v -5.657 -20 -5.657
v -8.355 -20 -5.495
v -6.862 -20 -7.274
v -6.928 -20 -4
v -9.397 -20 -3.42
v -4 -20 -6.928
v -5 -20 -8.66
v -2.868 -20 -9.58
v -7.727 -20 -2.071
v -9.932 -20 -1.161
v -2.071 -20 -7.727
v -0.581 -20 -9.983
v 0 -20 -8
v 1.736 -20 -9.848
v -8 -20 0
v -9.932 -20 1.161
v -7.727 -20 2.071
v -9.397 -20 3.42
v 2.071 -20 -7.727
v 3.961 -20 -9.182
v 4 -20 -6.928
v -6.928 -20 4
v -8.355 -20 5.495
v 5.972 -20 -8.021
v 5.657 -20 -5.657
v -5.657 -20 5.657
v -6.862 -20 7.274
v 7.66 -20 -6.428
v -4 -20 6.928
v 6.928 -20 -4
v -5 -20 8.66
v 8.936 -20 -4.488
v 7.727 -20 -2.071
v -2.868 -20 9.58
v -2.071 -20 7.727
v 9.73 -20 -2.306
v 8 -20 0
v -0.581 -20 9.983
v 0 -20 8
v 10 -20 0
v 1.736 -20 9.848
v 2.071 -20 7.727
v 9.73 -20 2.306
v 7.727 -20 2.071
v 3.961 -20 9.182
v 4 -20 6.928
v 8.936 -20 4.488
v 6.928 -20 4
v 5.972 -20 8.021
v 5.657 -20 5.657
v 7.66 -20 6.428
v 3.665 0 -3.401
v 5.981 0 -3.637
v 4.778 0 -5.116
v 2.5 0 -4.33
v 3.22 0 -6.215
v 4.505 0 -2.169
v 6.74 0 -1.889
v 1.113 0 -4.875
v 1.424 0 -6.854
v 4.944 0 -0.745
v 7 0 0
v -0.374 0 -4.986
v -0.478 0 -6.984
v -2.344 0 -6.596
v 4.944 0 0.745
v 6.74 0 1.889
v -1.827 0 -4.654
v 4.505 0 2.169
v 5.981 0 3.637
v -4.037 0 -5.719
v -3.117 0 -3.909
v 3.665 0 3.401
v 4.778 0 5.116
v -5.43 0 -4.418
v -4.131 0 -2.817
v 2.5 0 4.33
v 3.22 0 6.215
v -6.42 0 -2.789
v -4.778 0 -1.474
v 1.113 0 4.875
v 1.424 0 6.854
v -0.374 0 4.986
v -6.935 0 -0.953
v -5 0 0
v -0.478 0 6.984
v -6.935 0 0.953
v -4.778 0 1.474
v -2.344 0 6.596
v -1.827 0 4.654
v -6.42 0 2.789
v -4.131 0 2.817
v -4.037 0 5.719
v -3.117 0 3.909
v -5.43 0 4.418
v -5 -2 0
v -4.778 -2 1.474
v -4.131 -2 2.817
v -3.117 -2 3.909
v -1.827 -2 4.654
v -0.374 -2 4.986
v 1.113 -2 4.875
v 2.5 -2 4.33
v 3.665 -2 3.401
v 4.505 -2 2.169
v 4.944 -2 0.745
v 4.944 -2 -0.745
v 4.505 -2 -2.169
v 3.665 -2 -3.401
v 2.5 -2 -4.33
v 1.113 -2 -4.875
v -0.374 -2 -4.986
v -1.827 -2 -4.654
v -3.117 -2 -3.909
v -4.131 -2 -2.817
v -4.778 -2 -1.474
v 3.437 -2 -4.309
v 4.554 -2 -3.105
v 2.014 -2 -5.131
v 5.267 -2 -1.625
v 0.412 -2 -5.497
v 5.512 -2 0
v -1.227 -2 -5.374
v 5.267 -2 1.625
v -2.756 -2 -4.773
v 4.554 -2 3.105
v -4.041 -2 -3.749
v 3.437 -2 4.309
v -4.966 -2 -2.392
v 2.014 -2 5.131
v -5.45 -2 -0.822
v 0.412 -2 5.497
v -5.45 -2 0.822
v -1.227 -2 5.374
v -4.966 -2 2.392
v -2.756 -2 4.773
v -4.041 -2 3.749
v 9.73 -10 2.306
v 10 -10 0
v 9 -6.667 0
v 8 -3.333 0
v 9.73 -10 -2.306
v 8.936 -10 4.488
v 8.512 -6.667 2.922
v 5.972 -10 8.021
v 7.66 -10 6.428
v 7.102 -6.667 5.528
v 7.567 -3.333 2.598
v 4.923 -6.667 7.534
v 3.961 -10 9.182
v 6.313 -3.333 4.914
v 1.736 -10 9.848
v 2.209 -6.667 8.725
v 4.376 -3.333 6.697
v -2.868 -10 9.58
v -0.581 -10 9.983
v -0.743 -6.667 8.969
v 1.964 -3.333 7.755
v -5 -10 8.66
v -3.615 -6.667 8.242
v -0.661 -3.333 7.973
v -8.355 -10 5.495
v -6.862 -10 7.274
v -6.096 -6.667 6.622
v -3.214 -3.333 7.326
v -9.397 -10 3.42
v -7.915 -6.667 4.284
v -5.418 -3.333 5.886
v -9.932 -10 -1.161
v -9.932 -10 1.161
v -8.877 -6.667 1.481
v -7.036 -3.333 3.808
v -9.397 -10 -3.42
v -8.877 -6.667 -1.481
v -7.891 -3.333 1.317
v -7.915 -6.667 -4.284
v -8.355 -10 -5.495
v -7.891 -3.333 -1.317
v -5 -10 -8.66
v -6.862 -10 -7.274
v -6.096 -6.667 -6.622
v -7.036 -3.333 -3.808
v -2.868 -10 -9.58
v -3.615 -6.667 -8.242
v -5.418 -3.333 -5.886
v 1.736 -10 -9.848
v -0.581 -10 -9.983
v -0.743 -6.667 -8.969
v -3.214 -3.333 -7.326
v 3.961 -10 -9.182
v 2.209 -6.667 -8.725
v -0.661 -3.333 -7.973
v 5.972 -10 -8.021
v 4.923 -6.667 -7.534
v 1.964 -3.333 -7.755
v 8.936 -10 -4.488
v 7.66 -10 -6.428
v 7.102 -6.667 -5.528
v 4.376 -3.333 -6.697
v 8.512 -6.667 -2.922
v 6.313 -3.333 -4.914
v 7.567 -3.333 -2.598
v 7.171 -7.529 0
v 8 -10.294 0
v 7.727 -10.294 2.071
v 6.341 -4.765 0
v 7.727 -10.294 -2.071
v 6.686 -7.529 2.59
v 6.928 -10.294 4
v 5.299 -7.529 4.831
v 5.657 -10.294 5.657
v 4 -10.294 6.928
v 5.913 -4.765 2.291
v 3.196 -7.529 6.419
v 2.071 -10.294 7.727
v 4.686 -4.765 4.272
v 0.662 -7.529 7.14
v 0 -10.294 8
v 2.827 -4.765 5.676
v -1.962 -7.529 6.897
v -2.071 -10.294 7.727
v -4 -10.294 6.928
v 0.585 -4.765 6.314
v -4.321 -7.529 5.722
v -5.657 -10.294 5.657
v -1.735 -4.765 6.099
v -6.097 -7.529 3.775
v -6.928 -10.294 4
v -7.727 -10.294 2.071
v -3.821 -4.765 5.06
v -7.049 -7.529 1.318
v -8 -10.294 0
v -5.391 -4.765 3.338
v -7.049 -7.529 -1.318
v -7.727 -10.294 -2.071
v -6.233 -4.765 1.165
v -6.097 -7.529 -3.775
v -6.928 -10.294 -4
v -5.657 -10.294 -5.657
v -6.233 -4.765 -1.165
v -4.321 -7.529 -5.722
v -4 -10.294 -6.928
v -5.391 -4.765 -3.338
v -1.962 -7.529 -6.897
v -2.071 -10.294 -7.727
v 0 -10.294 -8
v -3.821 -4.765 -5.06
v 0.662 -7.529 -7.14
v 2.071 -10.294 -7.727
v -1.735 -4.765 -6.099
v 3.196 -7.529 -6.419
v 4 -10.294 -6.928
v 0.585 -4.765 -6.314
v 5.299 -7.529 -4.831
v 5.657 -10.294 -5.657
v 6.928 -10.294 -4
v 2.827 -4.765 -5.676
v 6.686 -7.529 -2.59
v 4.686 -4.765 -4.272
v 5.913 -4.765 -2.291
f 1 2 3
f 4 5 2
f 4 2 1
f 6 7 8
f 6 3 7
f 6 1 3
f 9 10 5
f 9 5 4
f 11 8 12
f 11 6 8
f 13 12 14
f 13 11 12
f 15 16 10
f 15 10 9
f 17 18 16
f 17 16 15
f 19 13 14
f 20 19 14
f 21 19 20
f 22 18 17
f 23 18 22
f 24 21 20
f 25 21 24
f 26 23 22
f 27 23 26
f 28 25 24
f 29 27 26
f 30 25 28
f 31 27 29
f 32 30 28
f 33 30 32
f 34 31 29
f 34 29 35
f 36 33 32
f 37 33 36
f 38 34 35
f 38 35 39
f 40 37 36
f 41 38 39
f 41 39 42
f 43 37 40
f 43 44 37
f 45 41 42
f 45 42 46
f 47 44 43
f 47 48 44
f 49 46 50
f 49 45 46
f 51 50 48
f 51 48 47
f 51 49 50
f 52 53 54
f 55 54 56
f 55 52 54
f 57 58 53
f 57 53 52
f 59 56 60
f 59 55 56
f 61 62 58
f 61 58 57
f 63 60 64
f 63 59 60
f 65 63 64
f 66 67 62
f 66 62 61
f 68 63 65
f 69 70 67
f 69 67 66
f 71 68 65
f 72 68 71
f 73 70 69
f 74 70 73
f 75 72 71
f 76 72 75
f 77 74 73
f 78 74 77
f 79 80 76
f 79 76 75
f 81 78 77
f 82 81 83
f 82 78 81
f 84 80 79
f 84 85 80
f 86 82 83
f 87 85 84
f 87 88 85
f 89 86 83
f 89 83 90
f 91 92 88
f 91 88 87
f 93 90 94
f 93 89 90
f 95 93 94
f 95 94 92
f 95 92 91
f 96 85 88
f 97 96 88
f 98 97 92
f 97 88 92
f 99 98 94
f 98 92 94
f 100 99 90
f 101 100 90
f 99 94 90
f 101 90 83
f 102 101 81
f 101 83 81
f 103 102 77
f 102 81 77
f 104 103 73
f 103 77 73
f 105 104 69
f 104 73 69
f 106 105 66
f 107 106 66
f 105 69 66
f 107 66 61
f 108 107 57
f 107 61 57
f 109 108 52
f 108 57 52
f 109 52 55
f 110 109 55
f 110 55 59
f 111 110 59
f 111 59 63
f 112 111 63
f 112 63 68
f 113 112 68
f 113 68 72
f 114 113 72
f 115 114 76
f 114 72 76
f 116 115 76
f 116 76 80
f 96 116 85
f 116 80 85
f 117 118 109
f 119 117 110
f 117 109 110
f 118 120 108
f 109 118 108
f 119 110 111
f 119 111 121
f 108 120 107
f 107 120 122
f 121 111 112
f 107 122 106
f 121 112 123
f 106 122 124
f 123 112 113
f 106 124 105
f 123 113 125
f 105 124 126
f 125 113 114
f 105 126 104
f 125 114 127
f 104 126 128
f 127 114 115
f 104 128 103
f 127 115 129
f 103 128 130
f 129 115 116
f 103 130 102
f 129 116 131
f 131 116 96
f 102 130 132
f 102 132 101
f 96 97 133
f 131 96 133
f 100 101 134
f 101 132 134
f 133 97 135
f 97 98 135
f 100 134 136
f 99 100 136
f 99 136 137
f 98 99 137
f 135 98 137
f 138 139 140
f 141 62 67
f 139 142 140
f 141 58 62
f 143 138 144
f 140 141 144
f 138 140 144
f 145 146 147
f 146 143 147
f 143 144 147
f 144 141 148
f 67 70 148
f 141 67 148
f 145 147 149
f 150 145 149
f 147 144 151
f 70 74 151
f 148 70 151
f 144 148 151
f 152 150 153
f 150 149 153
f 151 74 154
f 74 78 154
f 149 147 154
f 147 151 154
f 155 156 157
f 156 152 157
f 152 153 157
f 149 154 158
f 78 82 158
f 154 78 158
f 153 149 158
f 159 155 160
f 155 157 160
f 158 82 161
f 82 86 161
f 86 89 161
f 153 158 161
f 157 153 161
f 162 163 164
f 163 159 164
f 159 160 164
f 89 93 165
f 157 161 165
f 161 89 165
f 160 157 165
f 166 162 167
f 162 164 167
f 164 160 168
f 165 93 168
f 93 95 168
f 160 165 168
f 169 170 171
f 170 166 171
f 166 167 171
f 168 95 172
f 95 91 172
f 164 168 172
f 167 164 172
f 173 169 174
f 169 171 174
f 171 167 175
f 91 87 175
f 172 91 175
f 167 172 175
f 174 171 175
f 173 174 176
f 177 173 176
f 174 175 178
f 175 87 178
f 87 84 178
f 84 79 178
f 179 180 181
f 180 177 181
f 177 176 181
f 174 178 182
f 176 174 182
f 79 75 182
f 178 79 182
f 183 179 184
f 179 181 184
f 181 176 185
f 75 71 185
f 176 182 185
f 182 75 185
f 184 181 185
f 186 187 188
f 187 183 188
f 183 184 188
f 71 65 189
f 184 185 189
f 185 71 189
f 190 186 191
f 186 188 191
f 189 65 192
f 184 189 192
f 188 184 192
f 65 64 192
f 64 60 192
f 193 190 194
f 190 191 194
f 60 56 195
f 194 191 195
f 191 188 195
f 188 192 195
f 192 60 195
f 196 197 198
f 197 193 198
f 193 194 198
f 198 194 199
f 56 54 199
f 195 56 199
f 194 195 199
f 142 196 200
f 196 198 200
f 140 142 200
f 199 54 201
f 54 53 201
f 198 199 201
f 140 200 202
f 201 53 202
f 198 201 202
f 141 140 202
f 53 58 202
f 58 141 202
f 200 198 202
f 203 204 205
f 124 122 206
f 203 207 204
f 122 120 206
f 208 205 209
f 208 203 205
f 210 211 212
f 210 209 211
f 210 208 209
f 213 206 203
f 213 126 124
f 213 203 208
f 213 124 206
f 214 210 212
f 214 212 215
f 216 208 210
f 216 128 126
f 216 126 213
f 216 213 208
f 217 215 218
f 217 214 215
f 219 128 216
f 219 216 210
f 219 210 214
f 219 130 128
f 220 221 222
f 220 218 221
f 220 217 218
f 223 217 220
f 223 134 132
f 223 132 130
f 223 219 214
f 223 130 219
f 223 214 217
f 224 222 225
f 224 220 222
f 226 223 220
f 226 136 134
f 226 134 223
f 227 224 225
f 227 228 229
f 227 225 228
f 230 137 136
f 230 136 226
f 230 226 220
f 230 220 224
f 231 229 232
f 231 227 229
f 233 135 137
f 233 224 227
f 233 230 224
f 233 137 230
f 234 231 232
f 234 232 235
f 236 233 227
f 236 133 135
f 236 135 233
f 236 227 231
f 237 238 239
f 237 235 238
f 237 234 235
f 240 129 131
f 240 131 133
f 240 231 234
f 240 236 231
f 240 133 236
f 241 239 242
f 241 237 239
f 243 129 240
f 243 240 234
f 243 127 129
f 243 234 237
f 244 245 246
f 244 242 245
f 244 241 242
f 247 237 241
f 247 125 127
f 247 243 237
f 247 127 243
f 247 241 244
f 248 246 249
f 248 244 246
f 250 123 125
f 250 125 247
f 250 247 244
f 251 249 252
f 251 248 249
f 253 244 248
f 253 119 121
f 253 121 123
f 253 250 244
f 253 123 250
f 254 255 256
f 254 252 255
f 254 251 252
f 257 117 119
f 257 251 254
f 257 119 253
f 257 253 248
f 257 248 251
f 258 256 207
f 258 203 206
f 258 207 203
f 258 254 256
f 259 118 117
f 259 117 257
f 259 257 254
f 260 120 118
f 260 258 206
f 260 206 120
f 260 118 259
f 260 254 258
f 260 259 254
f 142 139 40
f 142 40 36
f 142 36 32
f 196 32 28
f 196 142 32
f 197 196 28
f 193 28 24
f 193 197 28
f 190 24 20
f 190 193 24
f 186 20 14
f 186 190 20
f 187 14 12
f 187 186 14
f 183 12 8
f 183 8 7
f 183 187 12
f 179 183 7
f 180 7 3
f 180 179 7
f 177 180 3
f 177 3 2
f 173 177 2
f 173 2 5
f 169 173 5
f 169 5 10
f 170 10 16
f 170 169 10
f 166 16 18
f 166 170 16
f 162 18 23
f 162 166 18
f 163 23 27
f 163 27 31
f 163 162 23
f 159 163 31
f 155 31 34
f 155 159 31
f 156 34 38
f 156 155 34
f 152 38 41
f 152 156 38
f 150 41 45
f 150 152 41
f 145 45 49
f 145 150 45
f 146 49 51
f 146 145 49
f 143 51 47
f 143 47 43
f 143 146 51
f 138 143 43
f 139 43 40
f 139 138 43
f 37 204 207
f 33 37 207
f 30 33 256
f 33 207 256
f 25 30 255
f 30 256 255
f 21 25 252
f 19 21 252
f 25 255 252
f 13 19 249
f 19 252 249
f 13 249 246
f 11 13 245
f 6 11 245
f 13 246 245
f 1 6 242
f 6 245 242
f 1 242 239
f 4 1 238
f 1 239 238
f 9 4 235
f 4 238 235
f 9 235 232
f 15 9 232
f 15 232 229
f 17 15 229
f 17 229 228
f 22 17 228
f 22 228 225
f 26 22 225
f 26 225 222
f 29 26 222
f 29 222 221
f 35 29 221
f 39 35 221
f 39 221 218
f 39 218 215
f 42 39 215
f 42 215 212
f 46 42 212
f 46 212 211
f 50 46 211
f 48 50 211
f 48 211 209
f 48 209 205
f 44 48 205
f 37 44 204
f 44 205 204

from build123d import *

# Parameters (mm, degrees)
F0_R       = 10
F1_DEPTH   = 10
F1_FACE1_R = 10
F2_R       = 7
F4_DEPTH   = 10
F5_T       = -2
F6_R       = 5
F7_DEPTH   = 2


with BuildPart() as f1:
    # F0 (on Front) → F1 (new body)
    with BuildSketch(Plane.XZ):
        Circle(F0_R)
    extrude(amount=F1_DEPTH)

    # F1_face1 (on face) → F3 section 0
    with BuildSketch(Plane.XZ.offset(10)):
        Circle(F1_FACE1_R)
    # F2 (on face) → F3 section 1
    with BuildSketch(Plane(origin=(0, 0, 0), x_dir=(-1, 0, 0), z_dir=(0, 1, 0))):
        Circle(F2_R)
    loft(mode=Mode.INTERSECT)

    # F4 (add): a face of the model
    f4_faces = [f1.faces().sort_by_distance(p)[0] for p in [
        (0, -10, 0),
    ]]
    extrude(f4_faces, amount=F4_DEPTH)

    # F5
    f5_openings = [f1.faces().sort_by_distance(p)[0] for p in [
        (0, -20, 0),
    ]]
    offset(amount=F5_T, openings=f5_openings)

    # F6 (on face) → F7 (cut)
    with BuildSketch(Plane(origin=(0, 0, 0), x_dir=(-1, 0, 0), z_dir=(0, 1, 0))):
        Circle(F6_R)
    extrude(amount=-F7_DEPTH, mode=Mode.SUBTRACT)


solid = f1.part
